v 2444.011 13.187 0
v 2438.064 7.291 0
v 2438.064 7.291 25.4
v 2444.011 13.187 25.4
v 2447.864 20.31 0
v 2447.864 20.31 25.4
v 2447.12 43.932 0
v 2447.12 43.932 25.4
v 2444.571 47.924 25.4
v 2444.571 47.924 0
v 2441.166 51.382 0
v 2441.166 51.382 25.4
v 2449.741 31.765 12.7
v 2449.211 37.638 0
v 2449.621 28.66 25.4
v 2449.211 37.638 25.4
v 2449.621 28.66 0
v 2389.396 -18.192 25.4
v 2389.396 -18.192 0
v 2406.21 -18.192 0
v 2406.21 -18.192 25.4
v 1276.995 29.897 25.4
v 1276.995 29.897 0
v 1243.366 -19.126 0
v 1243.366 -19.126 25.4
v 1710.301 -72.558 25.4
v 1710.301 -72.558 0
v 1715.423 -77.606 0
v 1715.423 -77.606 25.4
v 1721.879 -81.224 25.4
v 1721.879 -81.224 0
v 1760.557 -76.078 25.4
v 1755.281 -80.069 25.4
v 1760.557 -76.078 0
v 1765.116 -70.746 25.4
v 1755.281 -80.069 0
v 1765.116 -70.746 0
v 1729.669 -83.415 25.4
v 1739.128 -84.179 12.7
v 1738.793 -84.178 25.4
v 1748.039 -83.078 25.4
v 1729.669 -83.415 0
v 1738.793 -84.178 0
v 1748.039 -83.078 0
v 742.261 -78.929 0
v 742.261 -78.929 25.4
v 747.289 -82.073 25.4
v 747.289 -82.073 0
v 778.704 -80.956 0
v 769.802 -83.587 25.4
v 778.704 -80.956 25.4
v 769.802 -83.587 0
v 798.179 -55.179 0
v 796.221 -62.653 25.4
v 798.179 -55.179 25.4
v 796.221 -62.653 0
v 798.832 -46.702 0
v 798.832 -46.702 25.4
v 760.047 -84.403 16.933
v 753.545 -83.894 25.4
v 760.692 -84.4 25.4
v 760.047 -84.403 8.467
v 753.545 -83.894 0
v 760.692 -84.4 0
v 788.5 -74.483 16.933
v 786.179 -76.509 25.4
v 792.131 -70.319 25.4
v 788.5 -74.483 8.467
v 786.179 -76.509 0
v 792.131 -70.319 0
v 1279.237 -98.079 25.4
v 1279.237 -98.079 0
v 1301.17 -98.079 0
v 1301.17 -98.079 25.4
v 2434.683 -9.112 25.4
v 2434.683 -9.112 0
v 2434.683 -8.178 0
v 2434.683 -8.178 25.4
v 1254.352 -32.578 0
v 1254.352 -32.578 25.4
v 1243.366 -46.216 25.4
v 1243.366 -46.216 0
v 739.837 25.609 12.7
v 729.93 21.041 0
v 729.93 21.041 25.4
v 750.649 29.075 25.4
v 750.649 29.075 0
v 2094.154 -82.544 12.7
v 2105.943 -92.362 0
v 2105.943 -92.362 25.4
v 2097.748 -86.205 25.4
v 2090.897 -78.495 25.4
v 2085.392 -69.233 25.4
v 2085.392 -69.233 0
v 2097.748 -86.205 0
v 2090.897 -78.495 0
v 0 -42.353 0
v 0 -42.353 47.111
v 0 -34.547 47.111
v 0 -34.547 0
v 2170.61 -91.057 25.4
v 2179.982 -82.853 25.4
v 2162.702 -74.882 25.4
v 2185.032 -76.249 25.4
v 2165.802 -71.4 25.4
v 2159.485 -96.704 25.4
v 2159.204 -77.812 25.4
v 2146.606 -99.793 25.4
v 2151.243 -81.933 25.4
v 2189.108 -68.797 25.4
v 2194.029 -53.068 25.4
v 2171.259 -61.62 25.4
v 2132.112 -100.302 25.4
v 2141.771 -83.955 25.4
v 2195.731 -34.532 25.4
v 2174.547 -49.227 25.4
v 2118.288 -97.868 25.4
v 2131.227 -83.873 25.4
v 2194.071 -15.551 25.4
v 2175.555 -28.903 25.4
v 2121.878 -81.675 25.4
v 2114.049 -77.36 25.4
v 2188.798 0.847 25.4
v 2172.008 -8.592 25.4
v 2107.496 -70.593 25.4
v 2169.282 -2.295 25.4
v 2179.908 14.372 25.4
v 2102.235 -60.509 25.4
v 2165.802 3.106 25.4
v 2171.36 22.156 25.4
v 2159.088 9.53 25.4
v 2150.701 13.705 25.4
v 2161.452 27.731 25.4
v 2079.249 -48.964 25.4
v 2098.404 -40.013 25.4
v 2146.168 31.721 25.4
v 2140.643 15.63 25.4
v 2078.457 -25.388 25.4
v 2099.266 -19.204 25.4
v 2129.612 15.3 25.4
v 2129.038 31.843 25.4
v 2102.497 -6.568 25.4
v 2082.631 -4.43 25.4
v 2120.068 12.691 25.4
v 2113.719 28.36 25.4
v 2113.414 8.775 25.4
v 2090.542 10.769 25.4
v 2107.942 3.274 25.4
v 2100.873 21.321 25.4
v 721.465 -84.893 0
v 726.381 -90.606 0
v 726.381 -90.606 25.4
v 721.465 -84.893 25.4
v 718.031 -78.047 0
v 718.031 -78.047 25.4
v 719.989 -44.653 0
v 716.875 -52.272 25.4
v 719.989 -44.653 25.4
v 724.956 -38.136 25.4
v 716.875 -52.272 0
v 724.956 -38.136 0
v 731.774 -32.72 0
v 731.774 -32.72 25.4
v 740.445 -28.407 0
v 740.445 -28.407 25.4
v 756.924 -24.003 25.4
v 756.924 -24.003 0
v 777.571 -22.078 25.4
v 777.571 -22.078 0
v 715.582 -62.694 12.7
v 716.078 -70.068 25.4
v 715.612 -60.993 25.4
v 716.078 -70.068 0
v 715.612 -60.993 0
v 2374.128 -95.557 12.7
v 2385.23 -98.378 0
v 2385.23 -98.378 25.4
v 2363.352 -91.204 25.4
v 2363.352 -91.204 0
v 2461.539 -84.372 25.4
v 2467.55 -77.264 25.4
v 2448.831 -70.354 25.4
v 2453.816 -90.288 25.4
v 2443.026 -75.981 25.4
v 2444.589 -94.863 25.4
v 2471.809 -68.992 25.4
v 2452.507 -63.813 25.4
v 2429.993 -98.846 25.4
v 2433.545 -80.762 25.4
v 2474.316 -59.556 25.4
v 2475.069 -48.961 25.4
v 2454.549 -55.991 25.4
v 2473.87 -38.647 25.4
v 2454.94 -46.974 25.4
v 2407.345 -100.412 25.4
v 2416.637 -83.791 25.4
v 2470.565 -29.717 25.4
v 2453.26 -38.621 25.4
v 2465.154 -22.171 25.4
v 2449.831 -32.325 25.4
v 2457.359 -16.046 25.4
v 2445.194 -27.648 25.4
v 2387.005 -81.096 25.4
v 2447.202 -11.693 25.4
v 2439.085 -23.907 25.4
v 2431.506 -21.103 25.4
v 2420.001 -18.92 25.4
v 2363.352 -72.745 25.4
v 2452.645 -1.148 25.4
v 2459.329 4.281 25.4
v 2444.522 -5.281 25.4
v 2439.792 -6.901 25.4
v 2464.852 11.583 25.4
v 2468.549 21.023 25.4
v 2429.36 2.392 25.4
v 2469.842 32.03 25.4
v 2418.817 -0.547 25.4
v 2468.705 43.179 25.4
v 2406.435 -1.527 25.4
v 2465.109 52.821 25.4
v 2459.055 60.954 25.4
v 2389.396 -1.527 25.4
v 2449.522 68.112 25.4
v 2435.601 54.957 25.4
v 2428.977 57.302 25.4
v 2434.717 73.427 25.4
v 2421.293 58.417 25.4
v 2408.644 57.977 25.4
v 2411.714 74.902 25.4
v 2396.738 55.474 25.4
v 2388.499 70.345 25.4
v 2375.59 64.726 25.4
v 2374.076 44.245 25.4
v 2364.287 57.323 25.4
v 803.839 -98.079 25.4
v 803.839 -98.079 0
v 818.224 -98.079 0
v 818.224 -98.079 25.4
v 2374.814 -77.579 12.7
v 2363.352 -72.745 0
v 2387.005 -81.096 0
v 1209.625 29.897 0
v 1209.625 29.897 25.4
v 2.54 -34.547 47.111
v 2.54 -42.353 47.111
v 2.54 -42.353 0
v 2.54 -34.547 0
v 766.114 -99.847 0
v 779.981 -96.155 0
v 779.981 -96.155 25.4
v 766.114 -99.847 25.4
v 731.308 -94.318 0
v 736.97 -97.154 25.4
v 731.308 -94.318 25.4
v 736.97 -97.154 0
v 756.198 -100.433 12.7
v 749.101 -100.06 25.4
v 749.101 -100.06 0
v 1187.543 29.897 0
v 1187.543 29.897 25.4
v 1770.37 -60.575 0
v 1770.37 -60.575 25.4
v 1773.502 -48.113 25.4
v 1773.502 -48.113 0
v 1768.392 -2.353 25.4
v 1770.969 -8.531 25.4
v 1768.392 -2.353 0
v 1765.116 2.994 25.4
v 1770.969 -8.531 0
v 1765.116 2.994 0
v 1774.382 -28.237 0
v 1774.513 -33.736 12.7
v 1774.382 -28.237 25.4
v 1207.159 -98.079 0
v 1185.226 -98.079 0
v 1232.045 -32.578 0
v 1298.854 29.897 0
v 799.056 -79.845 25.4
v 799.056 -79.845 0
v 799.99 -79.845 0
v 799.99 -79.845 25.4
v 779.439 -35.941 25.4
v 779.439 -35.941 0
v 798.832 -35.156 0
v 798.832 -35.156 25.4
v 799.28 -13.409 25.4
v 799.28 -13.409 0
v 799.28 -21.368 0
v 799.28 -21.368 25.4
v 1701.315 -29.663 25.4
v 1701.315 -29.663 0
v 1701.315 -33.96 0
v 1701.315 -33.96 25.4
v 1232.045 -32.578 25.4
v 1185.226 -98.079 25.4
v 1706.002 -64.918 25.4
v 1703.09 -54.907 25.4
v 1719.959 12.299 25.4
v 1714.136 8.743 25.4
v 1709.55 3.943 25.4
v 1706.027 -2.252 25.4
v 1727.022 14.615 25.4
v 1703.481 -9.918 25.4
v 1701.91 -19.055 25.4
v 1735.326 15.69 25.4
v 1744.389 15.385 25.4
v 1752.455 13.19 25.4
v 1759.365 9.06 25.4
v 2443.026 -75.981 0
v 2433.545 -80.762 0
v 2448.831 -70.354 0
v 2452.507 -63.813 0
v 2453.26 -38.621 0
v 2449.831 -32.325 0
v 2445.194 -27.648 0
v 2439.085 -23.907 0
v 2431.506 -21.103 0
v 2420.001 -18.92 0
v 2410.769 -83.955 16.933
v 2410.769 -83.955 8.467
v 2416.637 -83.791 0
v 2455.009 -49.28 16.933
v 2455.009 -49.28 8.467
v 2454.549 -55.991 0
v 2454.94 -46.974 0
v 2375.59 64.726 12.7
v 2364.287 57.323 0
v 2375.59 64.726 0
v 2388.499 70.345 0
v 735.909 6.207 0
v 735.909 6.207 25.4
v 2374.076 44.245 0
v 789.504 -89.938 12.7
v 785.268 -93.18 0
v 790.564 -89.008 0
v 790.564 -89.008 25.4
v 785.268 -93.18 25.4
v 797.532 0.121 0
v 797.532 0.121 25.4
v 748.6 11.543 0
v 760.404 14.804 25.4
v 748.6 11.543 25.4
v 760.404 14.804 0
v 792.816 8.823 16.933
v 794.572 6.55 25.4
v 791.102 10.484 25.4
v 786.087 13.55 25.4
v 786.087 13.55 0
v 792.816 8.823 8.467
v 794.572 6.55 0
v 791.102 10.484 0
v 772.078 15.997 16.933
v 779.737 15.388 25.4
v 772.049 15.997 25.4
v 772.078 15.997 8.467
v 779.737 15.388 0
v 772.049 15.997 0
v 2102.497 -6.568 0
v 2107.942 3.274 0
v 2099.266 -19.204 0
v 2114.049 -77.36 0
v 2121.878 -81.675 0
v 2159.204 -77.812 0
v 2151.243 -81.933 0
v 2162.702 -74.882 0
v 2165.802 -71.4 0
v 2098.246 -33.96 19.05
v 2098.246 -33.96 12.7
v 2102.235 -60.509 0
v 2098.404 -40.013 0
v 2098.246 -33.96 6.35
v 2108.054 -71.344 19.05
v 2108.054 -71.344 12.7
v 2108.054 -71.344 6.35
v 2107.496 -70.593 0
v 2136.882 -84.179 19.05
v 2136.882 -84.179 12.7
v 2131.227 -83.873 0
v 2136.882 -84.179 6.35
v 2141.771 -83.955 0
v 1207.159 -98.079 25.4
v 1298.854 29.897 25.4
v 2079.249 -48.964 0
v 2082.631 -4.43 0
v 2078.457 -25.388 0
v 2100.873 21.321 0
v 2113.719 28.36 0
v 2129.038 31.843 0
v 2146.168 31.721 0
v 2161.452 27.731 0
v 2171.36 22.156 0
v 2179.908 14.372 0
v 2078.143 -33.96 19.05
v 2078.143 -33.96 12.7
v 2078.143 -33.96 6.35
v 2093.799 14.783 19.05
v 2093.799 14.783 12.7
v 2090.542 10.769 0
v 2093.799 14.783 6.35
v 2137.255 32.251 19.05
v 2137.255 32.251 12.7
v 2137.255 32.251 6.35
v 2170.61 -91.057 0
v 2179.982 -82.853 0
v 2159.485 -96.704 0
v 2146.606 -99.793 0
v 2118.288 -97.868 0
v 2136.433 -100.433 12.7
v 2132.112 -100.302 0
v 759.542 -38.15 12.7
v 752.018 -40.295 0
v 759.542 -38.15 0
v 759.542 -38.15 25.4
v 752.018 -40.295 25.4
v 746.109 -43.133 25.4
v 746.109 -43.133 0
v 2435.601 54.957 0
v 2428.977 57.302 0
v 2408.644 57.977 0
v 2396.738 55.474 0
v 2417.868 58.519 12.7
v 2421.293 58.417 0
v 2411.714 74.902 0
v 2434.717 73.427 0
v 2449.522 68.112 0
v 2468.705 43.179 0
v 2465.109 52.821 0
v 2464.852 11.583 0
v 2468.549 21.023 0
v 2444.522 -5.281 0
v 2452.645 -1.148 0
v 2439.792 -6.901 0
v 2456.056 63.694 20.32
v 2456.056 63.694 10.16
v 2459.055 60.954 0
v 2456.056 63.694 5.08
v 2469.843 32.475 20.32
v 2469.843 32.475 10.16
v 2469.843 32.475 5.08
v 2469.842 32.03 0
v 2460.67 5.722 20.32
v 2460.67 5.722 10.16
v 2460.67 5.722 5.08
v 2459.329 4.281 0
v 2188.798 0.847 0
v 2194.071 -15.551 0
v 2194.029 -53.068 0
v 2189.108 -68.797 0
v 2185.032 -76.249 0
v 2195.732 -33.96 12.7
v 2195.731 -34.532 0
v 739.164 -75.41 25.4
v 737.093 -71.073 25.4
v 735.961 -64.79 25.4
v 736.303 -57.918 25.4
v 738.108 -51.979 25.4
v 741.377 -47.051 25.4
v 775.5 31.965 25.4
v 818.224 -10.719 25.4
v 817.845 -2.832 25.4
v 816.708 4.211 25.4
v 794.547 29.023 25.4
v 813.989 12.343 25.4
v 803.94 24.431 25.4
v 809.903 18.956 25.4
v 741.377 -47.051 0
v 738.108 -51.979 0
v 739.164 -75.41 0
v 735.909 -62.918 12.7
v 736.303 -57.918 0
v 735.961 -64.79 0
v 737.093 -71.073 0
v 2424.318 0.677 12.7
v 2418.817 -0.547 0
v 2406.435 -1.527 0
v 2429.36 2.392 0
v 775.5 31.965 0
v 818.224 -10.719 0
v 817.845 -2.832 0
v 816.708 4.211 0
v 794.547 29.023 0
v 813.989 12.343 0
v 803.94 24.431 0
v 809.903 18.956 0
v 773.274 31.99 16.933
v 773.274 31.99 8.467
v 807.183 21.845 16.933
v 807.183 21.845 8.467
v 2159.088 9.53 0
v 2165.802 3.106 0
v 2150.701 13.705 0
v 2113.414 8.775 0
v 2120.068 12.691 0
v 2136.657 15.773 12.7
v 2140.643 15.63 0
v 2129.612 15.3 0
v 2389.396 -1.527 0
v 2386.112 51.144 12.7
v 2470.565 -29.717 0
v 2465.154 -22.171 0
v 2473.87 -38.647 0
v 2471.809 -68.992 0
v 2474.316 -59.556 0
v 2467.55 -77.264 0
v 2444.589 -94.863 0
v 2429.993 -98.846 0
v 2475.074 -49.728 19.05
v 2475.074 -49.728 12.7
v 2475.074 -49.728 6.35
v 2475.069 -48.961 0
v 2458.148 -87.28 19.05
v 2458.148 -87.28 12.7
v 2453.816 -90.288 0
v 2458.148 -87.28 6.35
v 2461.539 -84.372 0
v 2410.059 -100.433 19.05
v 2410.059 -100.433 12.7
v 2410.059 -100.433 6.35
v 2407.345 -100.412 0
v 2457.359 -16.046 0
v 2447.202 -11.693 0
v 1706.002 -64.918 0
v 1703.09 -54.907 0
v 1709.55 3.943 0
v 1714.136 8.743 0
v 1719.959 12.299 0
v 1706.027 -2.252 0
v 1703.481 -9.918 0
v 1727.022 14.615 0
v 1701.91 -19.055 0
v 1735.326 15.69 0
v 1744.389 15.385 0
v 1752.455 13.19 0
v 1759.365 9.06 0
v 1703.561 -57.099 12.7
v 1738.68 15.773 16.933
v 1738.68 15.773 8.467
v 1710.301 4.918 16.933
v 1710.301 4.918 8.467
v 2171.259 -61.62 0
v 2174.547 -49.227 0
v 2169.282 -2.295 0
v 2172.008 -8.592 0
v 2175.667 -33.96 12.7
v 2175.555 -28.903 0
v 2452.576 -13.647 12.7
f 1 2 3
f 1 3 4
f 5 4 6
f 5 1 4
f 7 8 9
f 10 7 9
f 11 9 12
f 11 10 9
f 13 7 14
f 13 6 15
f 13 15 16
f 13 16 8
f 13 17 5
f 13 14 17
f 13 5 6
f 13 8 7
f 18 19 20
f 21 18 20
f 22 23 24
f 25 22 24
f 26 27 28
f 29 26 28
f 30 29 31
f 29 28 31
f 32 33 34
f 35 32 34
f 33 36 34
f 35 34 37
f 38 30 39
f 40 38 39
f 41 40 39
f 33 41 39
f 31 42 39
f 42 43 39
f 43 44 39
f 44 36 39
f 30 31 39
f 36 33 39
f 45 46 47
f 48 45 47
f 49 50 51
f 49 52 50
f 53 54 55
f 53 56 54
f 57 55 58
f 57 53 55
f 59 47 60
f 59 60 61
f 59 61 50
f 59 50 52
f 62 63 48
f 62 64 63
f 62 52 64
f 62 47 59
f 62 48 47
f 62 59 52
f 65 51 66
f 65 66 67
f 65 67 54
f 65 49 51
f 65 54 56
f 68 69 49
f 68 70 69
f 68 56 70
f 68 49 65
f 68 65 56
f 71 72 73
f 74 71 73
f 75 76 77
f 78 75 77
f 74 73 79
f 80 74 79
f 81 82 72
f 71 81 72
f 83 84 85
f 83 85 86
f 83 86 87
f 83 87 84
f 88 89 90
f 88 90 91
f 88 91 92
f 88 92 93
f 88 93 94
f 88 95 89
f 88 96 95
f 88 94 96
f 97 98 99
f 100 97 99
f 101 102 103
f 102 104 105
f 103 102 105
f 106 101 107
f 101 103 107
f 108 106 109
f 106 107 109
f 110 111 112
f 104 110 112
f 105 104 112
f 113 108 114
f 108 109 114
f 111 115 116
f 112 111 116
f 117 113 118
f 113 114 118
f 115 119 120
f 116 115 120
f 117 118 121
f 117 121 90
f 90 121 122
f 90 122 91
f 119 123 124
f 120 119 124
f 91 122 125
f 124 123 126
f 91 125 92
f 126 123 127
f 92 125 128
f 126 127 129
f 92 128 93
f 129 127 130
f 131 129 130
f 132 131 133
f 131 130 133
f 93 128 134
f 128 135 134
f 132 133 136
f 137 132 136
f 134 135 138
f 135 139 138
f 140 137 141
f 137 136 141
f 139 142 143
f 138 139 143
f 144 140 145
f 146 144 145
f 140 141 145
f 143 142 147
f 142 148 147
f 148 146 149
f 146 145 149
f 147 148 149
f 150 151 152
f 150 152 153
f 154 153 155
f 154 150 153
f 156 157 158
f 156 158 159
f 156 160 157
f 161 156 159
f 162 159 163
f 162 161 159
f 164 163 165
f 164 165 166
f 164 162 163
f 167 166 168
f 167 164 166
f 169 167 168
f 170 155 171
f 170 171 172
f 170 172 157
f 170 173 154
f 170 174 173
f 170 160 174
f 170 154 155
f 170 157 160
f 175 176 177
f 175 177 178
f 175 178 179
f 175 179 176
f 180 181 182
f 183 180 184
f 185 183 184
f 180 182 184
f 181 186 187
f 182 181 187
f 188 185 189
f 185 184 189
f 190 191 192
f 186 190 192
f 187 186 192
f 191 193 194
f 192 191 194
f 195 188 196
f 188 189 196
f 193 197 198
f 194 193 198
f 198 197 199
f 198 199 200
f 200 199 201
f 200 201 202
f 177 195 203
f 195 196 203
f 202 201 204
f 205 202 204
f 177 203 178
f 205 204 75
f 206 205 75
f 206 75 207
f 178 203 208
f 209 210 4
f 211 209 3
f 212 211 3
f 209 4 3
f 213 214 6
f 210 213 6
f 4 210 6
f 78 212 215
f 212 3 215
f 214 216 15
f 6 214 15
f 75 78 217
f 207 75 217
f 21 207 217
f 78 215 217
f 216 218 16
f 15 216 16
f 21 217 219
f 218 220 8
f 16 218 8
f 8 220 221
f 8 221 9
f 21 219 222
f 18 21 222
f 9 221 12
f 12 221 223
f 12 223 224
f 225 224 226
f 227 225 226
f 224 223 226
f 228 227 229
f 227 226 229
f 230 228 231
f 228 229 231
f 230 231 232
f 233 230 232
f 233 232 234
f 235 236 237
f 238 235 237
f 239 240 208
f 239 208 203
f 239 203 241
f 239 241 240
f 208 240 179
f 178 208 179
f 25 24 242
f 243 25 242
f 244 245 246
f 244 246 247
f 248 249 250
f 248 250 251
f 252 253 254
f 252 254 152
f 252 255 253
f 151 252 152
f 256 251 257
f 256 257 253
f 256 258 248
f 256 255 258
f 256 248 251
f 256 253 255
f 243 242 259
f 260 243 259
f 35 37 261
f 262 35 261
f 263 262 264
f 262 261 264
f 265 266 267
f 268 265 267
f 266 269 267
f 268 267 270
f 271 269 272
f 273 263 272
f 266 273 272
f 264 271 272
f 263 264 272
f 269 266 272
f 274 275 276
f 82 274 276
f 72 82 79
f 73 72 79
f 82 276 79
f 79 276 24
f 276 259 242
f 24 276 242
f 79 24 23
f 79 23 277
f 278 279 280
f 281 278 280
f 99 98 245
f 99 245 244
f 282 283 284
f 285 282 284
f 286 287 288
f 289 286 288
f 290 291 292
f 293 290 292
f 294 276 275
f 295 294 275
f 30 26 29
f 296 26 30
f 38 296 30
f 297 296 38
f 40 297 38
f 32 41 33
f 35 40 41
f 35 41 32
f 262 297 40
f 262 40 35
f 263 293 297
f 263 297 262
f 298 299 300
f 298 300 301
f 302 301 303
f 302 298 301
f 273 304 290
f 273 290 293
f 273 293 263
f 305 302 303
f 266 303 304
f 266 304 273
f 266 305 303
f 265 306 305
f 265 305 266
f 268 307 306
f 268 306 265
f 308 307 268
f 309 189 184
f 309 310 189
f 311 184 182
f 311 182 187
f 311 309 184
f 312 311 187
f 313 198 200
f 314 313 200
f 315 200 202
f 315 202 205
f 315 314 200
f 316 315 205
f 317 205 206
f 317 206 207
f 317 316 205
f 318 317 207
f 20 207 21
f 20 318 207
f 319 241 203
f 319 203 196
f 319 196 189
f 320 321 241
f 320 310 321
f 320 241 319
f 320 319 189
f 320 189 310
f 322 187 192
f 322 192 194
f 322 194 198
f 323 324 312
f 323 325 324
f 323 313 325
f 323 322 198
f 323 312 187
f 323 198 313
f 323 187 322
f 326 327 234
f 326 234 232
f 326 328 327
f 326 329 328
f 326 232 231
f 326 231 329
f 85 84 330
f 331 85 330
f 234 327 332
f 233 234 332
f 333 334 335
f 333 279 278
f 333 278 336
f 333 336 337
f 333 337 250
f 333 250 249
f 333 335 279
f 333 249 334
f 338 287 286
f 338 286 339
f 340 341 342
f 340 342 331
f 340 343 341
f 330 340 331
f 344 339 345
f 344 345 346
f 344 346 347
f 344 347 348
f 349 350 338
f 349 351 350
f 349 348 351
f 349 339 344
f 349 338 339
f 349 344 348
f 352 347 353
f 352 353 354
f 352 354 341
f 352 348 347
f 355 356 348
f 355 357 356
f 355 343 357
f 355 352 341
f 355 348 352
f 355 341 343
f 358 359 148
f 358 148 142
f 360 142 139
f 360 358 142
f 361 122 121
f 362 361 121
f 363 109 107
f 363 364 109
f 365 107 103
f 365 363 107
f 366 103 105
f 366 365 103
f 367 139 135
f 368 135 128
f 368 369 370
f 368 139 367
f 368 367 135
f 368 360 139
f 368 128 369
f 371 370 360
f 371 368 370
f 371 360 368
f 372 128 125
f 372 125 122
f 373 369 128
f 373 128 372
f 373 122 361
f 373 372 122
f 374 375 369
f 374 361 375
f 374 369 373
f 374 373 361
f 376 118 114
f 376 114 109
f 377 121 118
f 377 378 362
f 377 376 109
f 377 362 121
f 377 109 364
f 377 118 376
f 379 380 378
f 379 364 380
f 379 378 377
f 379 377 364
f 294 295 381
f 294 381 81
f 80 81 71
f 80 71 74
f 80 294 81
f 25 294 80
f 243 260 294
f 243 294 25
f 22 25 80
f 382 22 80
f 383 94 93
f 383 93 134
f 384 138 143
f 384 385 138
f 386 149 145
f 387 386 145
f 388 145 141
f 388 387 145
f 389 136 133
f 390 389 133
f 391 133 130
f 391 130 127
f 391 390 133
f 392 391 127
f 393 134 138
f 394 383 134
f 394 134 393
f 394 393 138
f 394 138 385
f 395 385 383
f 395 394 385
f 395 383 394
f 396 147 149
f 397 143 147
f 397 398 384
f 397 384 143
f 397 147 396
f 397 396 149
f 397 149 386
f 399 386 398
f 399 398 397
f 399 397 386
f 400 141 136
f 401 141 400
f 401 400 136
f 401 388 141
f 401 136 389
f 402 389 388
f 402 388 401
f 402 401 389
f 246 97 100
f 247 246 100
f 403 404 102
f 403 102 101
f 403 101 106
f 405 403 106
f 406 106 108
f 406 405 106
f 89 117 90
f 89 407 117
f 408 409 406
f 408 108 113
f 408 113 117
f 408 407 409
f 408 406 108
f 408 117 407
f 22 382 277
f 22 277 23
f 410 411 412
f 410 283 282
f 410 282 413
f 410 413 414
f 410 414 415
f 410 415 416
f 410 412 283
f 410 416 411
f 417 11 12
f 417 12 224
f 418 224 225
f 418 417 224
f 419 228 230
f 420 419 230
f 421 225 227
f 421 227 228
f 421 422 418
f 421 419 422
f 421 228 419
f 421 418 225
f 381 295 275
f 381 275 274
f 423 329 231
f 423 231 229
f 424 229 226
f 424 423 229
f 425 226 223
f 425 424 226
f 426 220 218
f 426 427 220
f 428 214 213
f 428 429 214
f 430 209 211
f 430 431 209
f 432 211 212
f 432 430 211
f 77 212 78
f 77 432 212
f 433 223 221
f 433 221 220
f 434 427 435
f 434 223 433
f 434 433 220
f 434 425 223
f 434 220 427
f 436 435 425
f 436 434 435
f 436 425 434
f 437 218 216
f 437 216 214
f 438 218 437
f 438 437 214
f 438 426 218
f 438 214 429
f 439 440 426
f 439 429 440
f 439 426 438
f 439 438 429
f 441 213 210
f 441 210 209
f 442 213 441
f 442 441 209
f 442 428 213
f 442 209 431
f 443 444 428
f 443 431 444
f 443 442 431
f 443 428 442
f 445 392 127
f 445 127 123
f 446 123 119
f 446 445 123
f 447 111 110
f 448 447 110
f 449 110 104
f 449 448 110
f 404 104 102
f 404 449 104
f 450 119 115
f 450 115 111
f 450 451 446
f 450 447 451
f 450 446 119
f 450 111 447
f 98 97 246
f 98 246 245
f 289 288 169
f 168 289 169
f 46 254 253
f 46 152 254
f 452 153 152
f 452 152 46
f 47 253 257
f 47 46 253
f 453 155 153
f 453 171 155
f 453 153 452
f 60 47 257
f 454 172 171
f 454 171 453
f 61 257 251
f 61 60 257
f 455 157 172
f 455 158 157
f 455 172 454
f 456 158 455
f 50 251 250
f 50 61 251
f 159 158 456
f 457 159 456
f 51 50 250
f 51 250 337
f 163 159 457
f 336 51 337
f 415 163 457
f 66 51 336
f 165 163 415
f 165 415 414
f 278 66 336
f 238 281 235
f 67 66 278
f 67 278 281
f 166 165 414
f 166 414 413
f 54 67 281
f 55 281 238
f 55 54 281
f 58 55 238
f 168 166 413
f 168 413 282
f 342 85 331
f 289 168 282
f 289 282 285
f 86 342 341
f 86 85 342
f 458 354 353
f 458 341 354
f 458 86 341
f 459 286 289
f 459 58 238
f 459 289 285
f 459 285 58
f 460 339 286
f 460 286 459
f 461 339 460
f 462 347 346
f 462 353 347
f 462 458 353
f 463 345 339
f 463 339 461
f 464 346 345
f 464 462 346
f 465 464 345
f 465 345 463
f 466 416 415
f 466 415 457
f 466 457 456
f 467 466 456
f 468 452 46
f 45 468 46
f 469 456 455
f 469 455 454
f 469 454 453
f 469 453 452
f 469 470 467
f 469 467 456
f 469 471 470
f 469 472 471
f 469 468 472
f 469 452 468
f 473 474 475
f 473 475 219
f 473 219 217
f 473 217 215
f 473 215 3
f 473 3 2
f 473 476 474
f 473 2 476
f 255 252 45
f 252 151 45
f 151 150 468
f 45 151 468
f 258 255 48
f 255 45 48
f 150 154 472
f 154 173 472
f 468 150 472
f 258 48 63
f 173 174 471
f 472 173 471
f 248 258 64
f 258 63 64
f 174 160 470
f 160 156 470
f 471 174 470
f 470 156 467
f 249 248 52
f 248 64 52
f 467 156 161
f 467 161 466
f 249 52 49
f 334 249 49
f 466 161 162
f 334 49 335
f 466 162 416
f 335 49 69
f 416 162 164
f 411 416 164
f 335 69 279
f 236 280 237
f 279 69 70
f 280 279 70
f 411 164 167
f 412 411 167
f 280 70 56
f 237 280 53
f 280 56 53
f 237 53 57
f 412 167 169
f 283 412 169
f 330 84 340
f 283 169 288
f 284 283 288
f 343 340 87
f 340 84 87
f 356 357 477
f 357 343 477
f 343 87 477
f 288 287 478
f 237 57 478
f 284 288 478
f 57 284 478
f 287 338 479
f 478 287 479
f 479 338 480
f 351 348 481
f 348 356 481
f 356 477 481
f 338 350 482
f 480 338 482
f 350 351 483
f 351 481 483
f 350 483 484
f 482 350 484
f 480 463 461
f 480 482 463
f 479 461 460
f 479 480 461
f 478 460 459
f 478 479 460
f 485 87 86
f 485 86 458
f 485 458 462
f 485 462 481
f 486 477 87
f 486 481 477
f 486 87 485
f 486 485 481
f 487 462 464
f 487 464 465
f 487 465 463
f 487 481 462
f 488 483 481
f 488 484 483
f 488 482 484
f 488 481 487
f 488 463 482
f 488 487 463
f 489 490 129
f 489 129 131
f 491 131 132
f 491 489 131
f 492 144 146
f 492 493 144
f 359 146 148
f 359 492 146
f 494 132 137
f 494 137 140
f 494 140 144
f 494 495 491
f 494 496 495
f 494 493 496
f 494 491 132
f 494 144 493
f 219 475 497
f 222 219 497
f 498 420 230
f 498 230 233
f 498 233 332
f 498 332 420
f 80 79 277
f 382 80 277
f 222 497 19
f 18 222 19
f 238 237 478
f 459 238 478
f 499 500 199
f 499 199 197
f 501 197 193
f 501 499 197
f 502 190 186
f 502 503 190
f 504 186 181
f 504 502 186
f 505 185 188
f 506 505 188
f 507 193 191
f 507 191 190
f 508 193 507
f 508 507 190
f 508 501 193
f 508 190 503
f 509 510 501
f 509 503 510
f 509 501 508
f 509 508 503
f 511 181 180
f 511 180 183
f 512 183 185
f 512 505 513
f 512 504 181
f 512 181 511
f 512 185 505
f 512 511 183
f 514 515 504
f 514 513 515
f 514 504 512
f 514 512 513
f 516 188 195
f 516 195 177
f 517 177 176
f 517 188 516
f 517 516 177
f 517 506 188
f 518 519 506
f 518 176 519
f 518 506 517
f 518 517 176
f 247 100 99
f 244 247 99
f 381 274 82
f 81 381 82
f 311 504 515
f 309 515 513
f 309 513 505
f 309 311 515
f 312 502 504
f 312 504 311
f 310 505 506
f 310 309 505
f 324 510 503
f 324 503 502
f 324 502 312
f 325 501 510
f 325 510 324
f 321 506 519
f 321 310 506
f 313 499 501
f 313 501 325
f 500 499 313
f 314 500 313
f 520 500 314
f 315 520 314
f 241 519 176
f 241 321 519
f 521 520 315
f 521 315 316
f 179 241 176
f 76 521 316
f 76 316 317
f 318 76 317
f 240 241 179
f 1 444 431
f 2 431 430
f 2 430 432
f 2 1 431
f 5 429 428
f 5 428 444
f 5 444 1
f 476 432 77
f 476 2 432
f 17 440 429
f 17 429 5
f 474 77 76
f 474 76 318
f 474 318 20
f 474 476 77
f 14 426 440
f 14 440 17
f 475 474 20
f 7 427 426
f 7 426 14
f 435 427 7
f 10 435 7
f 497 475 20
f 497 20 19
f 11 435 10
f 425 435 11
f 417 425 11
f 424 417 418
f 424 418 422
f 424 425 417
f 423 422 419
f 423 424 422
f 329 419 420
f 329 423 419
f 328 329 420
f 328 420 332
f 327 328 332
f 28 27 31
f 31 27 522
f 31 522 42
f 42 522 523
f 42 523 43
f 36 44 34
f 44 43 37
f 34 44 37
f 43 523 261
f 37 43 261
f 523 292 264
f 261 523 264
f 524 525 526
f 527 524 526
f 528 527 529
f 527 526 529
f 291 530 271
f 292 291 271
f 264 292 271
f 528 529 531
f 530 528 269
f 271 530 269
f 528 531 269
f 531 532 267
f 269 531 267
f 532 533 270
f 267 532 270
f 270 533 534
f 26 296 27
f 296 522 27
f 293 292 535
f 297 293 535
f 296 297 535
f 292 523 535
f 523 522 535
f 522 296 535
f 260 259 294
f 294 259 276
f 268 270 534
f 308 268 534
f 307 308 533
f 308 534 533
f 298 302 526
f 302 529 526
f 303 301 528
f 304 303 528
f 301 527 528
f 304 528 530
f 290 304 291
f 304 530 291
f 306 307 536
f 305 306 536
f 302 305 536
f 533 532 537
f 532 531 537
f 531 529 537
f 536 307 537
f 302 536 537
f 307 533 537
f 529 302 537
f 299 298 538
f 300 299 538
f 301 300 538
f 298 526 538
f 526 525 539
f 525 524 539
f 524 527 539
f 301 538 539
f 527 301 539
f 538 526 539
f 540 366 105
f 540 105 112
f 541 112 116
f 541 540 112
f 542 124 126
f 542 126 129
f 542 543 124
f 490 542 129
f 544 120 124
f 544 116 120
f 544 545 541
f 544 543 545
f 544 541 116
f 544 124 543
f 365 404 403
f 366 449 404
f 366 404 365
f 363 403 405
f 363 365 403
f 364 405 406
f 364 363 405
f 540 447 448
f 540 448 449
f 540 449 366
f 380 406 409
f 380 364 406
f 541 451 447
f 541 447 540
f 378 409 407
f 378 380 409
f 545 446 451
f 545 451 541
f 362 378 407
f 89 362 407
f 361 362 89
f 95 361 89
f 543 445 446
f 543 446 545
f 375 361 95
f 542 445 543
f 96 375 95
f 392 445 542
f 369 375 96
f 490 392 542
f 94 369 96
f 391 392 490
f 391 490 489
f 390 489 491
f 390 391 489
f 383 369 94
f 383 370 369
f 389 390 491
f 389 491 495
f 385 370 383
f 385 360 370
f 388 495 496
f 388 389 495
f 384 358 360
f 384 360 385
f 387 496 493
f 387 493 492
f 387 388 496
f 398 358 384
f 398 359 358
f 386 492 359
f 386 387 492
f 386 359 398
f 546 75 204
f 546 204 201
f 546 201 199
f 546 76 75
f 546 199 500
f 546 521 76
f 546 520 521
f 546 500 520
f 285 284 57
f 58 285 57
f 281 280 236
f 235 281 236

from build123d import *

# Parameters (mm, degrees)
F0_W     = 7.8056156635
F0_H     = 47.1107587218
F1_DEPTH = 2.54
F3_DEPTH = 25.4


with BuildPart() as f1:
    # F0 (on Right) → F1 (new body)
    with BuildSketch(Plane.YZ):
        with Locations((-38.4498685598, 23.5553793609)):
            Rectangle(F0_W, F0_H)
    extrude(amount=F1_DEPTH)


with BuildPart() as f3:
    # F2 (on Top) → F3 (new body)
    with BuildSketch(Plane.XY):
        with BuildLine():
            Line((799.9901114413, -79.8446993059), (803.8387327154, -98.078943789))
            Line((803.8387327154, -98.078943789), (818.2243559244, -98.078943789))
            Line((818.2243559244, -98.078943789), (818.2243559244, -10.7189773925))
            add(Edge.make_bspline(
                [(807.1829230458, 21.844842417), (818.2243559244, 11.7001756605), (818.2243559244, -10.7189773925)],
                knots=[0, 0, 0, 1, 1, 1], degree=2))
            add(Edge.make_bspline(
                [(773.2739540532, 31.9895091735), (796.1414901672, 31.9895091735), (807.1829230458, 21.844842417)],
                knots=[0, 0, 0, 1, 1, 1], degree=2))
            add(Edge.make_bspline(
                [(750.6492920972, 29.0750192766), (761.9149165063, 31.9895091735), (773.2739540532, 31.9895091735)],
                knots=[0, 0, 0, 1, 1, 1], degree=2))
            add(Edge.make_bspline(
                [(729.9302581507, 21.0414894326), (739.383667688, 26.1605293797), (750.6492920972, 29.0750192766)],
                knots=[0, 0, 0, 1, 1, 1], degree=2))
            Line((729.9302581507, 21.0414894326), (735.9086989648, 6.2074831625))
            add(Edge.make_bspline(
                [(772.0782658903, 15.9971799957), (756.0859367125, 15.9971799957), (735.9086989648, 6.2074831625)],
                knots=[0, 0, 0, 1, 1, 1], degree=2))
            add(Edge.make_bspline(
                [(792.8159824644, 8.8230510187), (786.3517933341, 15.9971799957), (772.0782658903, 15.9971799957)],
                knots=[0, 0, 0, 1, 1, 1], degree=2))
            add(Edge.make_bspline(
                [(799.2801715946, -13.4092757588), (799.2801715946, 1.6489220418), (792.8159824644, 8.8230510187)],
                knots=[0, 0, 0, 1, 1, 1], degree=2))
            Line((799.2801715946, -13.4092757588), (799.2801715946, -21.3680750926))
            Line((799.2801715946, -21.3680750926), (777.5709583883, -22.0780149393))
            add(Edge.make_bspline(
                [(715.5820001968, -62.6940472203), (715.5820001968, -23.9462776937), (777.5709583883, -22.0780149393)],
                knots=[0, 0, 0, 1, 1, 1], degree=2))
            add(Edge.make_bspline(
                [(726.3805589173, -90.6058927713), (715.5820001968, -80.7788306831), (715.5820001968, -62.6940472203)],
                knots=[0, 0, 0, 1, 1, 1], degree=2))
            add(Edge.make_bspline(
                [(756.1980324778, -100.4329548596), (737.1791176378, -100.4329548596), (726.3805589173, -90.6058927713)],
                knots=[0, 0, 0, 1, 1, 1], degree=2))
            add(Edge.make_bspline(
                [(779.9810173415, -96.154633152), (770.4715599215, -100.4329548596), (756.1980324778, -100.4329548596)],
                knots=[0, 0, 0, 1, 1, 1], degree=2))
            add(Edge.make_bspline(
                [(799.0559800641, -79.8446993059), (789.4904747615, -91.8763114443), (779.9810173415, -96.154633152)],
                knots=[0, 0, 0, 1, 1, 1], degree=2))
            Line((799.0559800641, -79.8446993059), (799.9901114413, -79.8446993059))
        make_face()
        with BuildLine():
            add(Edge.make_bspline(
                [(760.0466537519, -84.4032604267), (778.1688024697, -84.4032604267), (788.5002955017, -74.4827852007)],
                knots=[0, 0, 0, 1, 1, 1], degree=2))
            add(Edge.make_bspline(
                [(742.2607923298, -78.9292505562), (748.6128856949, -84.4032604267), (760.0466537519, -84.4032604267)],
                knots=[0, 0, 0, 1, 1, 1], degree=2))
            add(Edge.make_bspline(
                [(735.9086989648, -62.9182387509), (735.9086989648, -73.4552406858), (742.2607923298, -78.9292505562)],
                knots=[0, 0, 0, 1, 1, 1], degree=2))
            add(Edge.make_bspline(
                [(746.1094136039, -43.1333361816), (735.9086989648, -49.5041121742), (735.9086989648, -62.9182387509)],
                knots=[0, 0, 0, 1, 1, 1], degree=2))
            add(Edge.make_bspline(
                [(779.4392211427, -35.9405245771), (756.3101282431, -36.762560189), (746.1094136039, -43.1333361816)],
                knots=[0, 0, 0, 1, 1, 1], degree=2))
            Line((779.4392211427, -35.9405245771), (798.8317885336, -35.1558542202))
            Line((798.8317885336, -35.1558542202), (798.8317885336, -46.7017180425))
            add(Edge.make_bspline(
                [(788.5002955017, -74.4827852007), (798.8317885336, -64.5623099748), (798.8317885336, -46.7017180425)],
                knots=[0, 0, 0, 1, 1, 1], degree=2))
        make_face(mode=Mode.SUBTRACT)
        Polygon((1187.5425372176, 29.8970548886), (1232.0445560278, -32.5776516191), (1185.2258914021, -98.078943789), (1207.1592961389, -98.078943789), (1243.3662283195, -46.2159697264), (1279.2368732044, -98.078943789), (1301.1702779412, -98.078943789), (1254.3516133155, -32.5776516191), (1298.8536321257, 29.8970548886), (1276.9949578991, 29.8970548886), (1243.3662283195, -19.1261597873), (1209.6254029748, 29.8970548886), align=None)
        with BuildLine():
            add(Edge.make_bspline(
                [(1765.1159677456, 2.994071225), (1755.7186060908, 15.7729884652), (1738.6800497706, 15.7729884652)],
                knots=[0, 0, 0, 1, 1, 1], degree=2))
            add(Edge.make_bspline(
                [(1738.6800497706, 15.7729884652), (1719.0632908492, 15.7729884652), (1710.301138531, 4.918381862)],
                knots=[0, 0, 0, 1, 1, 1], degree=2))
            add(Edge.make_bspline(
                [(1710.301138531, 4.918381862), (1701.5389862128, -5.9362247412), (1701.3147946822, -29.6631617223)],
                knots=[0, 0, 0, 1, 1, 1], degree=2))
            Line((1701.3147946822, -29.6631617223), (1701.3147946822, -33.9601660574))
            add(Edge.make_bspline(
                [(1701.3147946822, -33.9601660574), (1701.3147946822, -60.9378802312), (1710.301138531, -72.5584745637)],
                knots=[0, 0, 0, 1, 1, 1], degree=2))
            add(Edge.make_bspline(
                [(1710.301138531, -72.5584745637), (1719.2874823797, -84.1790688961), (1739.1284328316, -84.1790688961)],
                knots=[0, 0, 0, 1, 1, 1], degree=2))
            add(Edge.make_bspline(
                [(1739.1284328316, -84.1790688961), (1755.7186060908, -84.1790688961), (1765.1159677456, -70.7462596919)],
                knots=[0, 0, 0, 1, 1, 1], degree=2))
            add(Edge.make_bspline(
                [(1765.1159677456, -70.7462596919), (1774.5133294003, -57.3134504876), (1774.5133294003, -33.7359745269)],
                knots=[0, 0, 0, 1, 1, 1], degree=2))
            add(Edge.make_bspline(
                [(1774.5133294003, -33.7359745269), (1774.5133294003, -9.7848460153), (1765.1159677456, 2.994071225)],
                knots=[0, 0, 0, 1, 1, 1], degree=2))
        make_face()
        with BuildLine():
            add(Edge.make_bspline(
                [(2195.7318500111, -33.9601660574), (2195.7318500111, -65.2722498214), (2179.9823949914, -82.8526023405)],
                knots=[0, 0, 0, 1, 1, 1], degree=2))
            add(Edge.make_bspline(
                [(2179.9076644812, 14.3717913993), (2195.7318500111, -3.5074831604), (2195.7318500111, -33.9601660574)],
                knots=[0, 0, 0, 1, 1, 1], degree=2))
            add(Edge.make_bspline(
                [(2137.2552257979, 32.2510659591), (2164.0834789513, 32.2510659591), (2179.9076644812, 14.3717913993)],
                knots=[0, 0, 0, 1, 1, 1], degree=2))
            add(Edge.make_bspline(
                [(2093.7994341301, 14.7828092053), (2109.4554760121, 32.2510659591), (2137.2552257979, 32.2510659591)],
                knots=[0, 0, 0, 1, 1, 1], degree=2))
            add(Edge.make_bspline(
                [(2078.1433922481, -33.9601660574), (2078.1433922481, -2.6854475485), (2093.7994341301, 14.7828092053)],
                knots=[0, 0, 0, 1, 1, 1], degree=2))
            add(Edge.make_bspline(
                [(2085.3922517353, -69.2329668608), (2078.1433922481, -54.1747690602), (2078.1433922481, -33.9601660574)],
                knots=[0, 0, 0, 1, 1, 1], degree=2))
            add(Edge.make_bspline(
                [(2105.9431420338, -92.3620597605), (2092.6411112224, -84.2911646614), (2085.3922517353, -69.2329668608)],
                knots=[0, 0, 0, 1, 1, 1], degree=2))
            add(Edge.make_bspline(
                [(2136.4331901859, -100.4329548596), (2119.2451728453, -100.4329548596), (2105.9431420338, -92.3620597605)],
                knots=[0, 0, 0, 1, 1, 1], degree=2))
            add(Edge.make_bspline(
                [(2179.9823949914, -82.8526023405), (2164.2329399716, -100.4329548596), (2136.4331901859, -100.4329548596)],
                knots=[0, 0, 0, 1, 1, 1], degree=2))
        make_face()
        with BuildLine():
            add(Edge.make_bspline(
                [(2098.2458994856, -33.9601660574), (2098.2458994856, -58.5091386505), (2108.0542789463, -71.3441037733)],
                knots=[0, 0, 0, 1, 1, 1], degree=2))
            add(Edge.make_bspline(
                [(2107.9421831811, 3.2743106381), (2098.2458994856, -9.2243671889), (2098.2458994856, -33.9601660574)],
                knots=[0, 0, 0, 1, 1, 1], degree=2))
            add(Edge.make_bspline(
                [(2136.6573817165, 15.7729884652), (2117.6384668765, 15.7729884652), (2107.9421831811, 3.2743106381)],
                knots=[0, 0, 0, 1, 1, 1], degree=2))
            add(Edge.make_bspline(
                [(2165.8022806854, 3.1061669902), (2155.937853342, 15.7729884652), (2136.6573817165, 15.7729884652)],
                knots=[0, 0, 0, 1, 1, 1], degree=2))
            add(Edge.make_bspline(
                [(2175.6667080287, -33.9601660574), (2175.6667080287, -9.5606544847), (2165.8022806854, 3.1061669902)],
                knots=[0, 0, 0, 1, 1, 1], degree=2))
            add(Edge.make_bspline(
                [(2165.8022806854, -71.4001516559), (2175.6667080287, -58.6212344157), (2175.6667080287, -33.9601660574)],
                knots=[0, 0, 0, 1, 1, 1], degree=2))
            add(Edge.make_bspline(
                [(2136.881573247, -84.1790688961), (2155.937853342, -84.1790688961), (2165.8022806854, -71.4001516559)],
                knots=[0, 0, 0, 1, 1, 1], degree=2))
            add(Edge.make_bspline(
                [(2108.0542789463, -71.3441037733), (2117.862658407, -84.1790688961), (2136.881573247, -84.1790688961)],
                knots=[0, 0, 0, 1, 1, 1], degree=2))
        make_face(mode=Mode.SUBTRACT)
        with BuildLine():
            add(Edge.make_bspline(
                [(2469.8433613392, 32.4752574896), (2469.8433613392, 16.109275761), (2460.670191215, 5.7217348464)],
                knots=[0, 0, 0, 1, 1, 1], degree=2))
            add(Edge.make_bspline(
                [(2456.0555822116, 63.693928116), (2469.8433613392, 52.3162079416), (2469.8433613392, 32.4752574896)],
                knots=[0, 0, 0, 1, 1, 1], degree=2))
            add(Edge.make_bspline(
                [(2417.4199084502, 75.0716482904), (2442.267803084, 75.0716482904), (2456.0555822116, 63.693928116)],
                knots=[0, 0, 0, 1, 1, 1], degree=2))
            add(Edge.make_bspline(
                [(2388.4992010119, 70.3449435217), (2402.2122496293, 75.0716482904), (2417.4199084502, 75.0716482904)],
                knots=[0, 0, 0, 1, 1, 1], degree=2))
            add(Edge.make_bspline(
                [(2364.2865157146, 57.3231521234), (2374.7861523944, 65.618238753), (2388.4992010119, 70.3449435217)],
                knots=[0, 0, 0, 1, 1, 1], degree=2))
            Line((2364.2865157146, 57.3231521234), (2374.0762125478, 44.2453128425))
            add(Edge.make_bspline(
                [(2396.7382397588, 55.4735719965), (2386.8177645329, 52.4283037068), (2374.0762125478, 44.2453128425)],
                knots=[0, 0, 0, 1, 1, 1], degree=2))
            add(Edge.make_bspline(
                [(2417.8682915113, 58.5188402862), (2406.6587149848, 58.5188402862), (2396.7382397588, 55.4735719965)],
                knots=[0, 0, 0, 1, 1, 1], degree=2))
            add(Edge.make_bspline(
                [(2441.1655280589, 51.3820765643), (2432.5902020161, 58.5188402862), (2417.8682915113, 58.5188402862)],
                knots=[0, 0, 0, 1, 1, 1], degree=2))
            add(Edge.make_bspline(
                [(2449.7408541016, 31.765317643), (2449.7408541016, 44.2453128425), (2441.1655280589, 51.3820765643)],
                knots=[0, 0, 0, 1, 1, 1], degree=2))
            add(Edge.make_bspline(
                [(2438.0642118865, 7.2910755601), (2449.7408541016, 16.109275761), (2449.7408541016, 31.765317643)],
                knots=[0, 0, 0, 1, 1, 1], degree=2))
            add(Edge.make_bspline(
                [(2406.4345234543, -1.5271246407), (2426.3875696714, -1.5271246407), (2438.0642118865, 7.2910755601)],
                knots=[0, 0, 0, 1, 1, 1], degree=2))
            Line((2406.4345234543, -1.5271246407), (2389.395967134, -1.5271246407))
            Line((2389.395967134, -1.5271246407), (2389.395967134, -18.1920284101))
            Line((2389.395967134, -18.1920284101), (2406.2103319237, -18.1920284101))
            add(Edge.make_bspline(
                [(2455.0093550691, -49.2799206436), (2455.0093550691, -18.1920284101), (2406.2103319237, -18.1920284101)],
                knots=[0, 0, 0, 1, 1, 1], degree=2))
            add(Edge.make_bspline(
                [(2410.7688930445, -83.9548773656), (2455.0093550691, -83.9548773656), (2455.0093550691, -49.2799206436)],
                knots=[0, 0, 0, 1, 1, 1], degree=2))
            add(Edge.make_bspline(
                [(2387.0045908083, -81.0964353514), (2399.559316518, -83.9548773656), (2410.7688930445, -83.9548773656)],
                knots=[0, 0, 0, 1, 1, 1], degree=2))
            add(Edge.make_bspline(
                [(2363.3523843374, -72.7453008391), (2374.4498650986, -78.2379933371), (2387.0045908083, -81.0964353514)],
                knots=[0, 0, 0, 1, 1, 1], degree=2))
            Line((2363.3523843374, -72.7453008391), (2363.3523843374, -91.2037368528))
            add(Edge.make_bspline(
                [(2385.2297411916, -98.3778658297), (2373.9641167825, -96.3227767999), (2363.3523843374, -91.2037368528)],
                knots=[0, 0, 0, 1, 1, 1], degree=2))
            add(Edge.make_bspline(
                [(2410.0589531978, -100.4329548596), (2396.4953656008, -100.4329548596), (2385.2297411916, -98.3778658297)],
                knots=[0, 0, 0, 1, 1, 1], degree=2))
            add(Edge.make_bspline(
                [(2458.1480364965, -87.2803850685), (2441.2215759415, -100.4329548596), (2410.0589531978, -100.4329548596)],
                knots=[0, 0, 0, 1, 1, 1], degree=2))
            add(Edge.make_bspline(
                [(2475.0744970515, -49.7283037047), (2475.0744970515, -74.1278152774), (2458.1480364965, -87.2803850685)],
                knots=[0, 0, 0, 1, 1, 1], degree=2))
            add(Edge.make_bspline(
                [(2465.1540218256, -22.171428077), (2475.0744970515, -32.6897473844), (2475.0744970515, -49.7283037047)],
                knots=[0, 0, 0, 1, 1, 1], degree=2))
            add(Edge.make_bspline(
                [(2434.682656301, -9.1122714237), (2455.2335465996, -11.6531087697), (2465.1540218256, -22.171428077)],
                knots=[0, 0, 0, 1, 1, 1], degree=2))
            Line((2434.682656301, -9.1122714237), (2434.682656301, -8.1781400465))
            add(Edge.make_bspline(
                [(2460.670191215, 5.7217348464), (2451.4970210908, -4.6658060682), (2434.682656301, -8.1781400465)],
                knots=[0, 0, 0, 1, 1, 1], degree=2))
        make_face()
    extrude(amount=F3_DEPTH)


solid = Compound([f1.part, f3.part])
